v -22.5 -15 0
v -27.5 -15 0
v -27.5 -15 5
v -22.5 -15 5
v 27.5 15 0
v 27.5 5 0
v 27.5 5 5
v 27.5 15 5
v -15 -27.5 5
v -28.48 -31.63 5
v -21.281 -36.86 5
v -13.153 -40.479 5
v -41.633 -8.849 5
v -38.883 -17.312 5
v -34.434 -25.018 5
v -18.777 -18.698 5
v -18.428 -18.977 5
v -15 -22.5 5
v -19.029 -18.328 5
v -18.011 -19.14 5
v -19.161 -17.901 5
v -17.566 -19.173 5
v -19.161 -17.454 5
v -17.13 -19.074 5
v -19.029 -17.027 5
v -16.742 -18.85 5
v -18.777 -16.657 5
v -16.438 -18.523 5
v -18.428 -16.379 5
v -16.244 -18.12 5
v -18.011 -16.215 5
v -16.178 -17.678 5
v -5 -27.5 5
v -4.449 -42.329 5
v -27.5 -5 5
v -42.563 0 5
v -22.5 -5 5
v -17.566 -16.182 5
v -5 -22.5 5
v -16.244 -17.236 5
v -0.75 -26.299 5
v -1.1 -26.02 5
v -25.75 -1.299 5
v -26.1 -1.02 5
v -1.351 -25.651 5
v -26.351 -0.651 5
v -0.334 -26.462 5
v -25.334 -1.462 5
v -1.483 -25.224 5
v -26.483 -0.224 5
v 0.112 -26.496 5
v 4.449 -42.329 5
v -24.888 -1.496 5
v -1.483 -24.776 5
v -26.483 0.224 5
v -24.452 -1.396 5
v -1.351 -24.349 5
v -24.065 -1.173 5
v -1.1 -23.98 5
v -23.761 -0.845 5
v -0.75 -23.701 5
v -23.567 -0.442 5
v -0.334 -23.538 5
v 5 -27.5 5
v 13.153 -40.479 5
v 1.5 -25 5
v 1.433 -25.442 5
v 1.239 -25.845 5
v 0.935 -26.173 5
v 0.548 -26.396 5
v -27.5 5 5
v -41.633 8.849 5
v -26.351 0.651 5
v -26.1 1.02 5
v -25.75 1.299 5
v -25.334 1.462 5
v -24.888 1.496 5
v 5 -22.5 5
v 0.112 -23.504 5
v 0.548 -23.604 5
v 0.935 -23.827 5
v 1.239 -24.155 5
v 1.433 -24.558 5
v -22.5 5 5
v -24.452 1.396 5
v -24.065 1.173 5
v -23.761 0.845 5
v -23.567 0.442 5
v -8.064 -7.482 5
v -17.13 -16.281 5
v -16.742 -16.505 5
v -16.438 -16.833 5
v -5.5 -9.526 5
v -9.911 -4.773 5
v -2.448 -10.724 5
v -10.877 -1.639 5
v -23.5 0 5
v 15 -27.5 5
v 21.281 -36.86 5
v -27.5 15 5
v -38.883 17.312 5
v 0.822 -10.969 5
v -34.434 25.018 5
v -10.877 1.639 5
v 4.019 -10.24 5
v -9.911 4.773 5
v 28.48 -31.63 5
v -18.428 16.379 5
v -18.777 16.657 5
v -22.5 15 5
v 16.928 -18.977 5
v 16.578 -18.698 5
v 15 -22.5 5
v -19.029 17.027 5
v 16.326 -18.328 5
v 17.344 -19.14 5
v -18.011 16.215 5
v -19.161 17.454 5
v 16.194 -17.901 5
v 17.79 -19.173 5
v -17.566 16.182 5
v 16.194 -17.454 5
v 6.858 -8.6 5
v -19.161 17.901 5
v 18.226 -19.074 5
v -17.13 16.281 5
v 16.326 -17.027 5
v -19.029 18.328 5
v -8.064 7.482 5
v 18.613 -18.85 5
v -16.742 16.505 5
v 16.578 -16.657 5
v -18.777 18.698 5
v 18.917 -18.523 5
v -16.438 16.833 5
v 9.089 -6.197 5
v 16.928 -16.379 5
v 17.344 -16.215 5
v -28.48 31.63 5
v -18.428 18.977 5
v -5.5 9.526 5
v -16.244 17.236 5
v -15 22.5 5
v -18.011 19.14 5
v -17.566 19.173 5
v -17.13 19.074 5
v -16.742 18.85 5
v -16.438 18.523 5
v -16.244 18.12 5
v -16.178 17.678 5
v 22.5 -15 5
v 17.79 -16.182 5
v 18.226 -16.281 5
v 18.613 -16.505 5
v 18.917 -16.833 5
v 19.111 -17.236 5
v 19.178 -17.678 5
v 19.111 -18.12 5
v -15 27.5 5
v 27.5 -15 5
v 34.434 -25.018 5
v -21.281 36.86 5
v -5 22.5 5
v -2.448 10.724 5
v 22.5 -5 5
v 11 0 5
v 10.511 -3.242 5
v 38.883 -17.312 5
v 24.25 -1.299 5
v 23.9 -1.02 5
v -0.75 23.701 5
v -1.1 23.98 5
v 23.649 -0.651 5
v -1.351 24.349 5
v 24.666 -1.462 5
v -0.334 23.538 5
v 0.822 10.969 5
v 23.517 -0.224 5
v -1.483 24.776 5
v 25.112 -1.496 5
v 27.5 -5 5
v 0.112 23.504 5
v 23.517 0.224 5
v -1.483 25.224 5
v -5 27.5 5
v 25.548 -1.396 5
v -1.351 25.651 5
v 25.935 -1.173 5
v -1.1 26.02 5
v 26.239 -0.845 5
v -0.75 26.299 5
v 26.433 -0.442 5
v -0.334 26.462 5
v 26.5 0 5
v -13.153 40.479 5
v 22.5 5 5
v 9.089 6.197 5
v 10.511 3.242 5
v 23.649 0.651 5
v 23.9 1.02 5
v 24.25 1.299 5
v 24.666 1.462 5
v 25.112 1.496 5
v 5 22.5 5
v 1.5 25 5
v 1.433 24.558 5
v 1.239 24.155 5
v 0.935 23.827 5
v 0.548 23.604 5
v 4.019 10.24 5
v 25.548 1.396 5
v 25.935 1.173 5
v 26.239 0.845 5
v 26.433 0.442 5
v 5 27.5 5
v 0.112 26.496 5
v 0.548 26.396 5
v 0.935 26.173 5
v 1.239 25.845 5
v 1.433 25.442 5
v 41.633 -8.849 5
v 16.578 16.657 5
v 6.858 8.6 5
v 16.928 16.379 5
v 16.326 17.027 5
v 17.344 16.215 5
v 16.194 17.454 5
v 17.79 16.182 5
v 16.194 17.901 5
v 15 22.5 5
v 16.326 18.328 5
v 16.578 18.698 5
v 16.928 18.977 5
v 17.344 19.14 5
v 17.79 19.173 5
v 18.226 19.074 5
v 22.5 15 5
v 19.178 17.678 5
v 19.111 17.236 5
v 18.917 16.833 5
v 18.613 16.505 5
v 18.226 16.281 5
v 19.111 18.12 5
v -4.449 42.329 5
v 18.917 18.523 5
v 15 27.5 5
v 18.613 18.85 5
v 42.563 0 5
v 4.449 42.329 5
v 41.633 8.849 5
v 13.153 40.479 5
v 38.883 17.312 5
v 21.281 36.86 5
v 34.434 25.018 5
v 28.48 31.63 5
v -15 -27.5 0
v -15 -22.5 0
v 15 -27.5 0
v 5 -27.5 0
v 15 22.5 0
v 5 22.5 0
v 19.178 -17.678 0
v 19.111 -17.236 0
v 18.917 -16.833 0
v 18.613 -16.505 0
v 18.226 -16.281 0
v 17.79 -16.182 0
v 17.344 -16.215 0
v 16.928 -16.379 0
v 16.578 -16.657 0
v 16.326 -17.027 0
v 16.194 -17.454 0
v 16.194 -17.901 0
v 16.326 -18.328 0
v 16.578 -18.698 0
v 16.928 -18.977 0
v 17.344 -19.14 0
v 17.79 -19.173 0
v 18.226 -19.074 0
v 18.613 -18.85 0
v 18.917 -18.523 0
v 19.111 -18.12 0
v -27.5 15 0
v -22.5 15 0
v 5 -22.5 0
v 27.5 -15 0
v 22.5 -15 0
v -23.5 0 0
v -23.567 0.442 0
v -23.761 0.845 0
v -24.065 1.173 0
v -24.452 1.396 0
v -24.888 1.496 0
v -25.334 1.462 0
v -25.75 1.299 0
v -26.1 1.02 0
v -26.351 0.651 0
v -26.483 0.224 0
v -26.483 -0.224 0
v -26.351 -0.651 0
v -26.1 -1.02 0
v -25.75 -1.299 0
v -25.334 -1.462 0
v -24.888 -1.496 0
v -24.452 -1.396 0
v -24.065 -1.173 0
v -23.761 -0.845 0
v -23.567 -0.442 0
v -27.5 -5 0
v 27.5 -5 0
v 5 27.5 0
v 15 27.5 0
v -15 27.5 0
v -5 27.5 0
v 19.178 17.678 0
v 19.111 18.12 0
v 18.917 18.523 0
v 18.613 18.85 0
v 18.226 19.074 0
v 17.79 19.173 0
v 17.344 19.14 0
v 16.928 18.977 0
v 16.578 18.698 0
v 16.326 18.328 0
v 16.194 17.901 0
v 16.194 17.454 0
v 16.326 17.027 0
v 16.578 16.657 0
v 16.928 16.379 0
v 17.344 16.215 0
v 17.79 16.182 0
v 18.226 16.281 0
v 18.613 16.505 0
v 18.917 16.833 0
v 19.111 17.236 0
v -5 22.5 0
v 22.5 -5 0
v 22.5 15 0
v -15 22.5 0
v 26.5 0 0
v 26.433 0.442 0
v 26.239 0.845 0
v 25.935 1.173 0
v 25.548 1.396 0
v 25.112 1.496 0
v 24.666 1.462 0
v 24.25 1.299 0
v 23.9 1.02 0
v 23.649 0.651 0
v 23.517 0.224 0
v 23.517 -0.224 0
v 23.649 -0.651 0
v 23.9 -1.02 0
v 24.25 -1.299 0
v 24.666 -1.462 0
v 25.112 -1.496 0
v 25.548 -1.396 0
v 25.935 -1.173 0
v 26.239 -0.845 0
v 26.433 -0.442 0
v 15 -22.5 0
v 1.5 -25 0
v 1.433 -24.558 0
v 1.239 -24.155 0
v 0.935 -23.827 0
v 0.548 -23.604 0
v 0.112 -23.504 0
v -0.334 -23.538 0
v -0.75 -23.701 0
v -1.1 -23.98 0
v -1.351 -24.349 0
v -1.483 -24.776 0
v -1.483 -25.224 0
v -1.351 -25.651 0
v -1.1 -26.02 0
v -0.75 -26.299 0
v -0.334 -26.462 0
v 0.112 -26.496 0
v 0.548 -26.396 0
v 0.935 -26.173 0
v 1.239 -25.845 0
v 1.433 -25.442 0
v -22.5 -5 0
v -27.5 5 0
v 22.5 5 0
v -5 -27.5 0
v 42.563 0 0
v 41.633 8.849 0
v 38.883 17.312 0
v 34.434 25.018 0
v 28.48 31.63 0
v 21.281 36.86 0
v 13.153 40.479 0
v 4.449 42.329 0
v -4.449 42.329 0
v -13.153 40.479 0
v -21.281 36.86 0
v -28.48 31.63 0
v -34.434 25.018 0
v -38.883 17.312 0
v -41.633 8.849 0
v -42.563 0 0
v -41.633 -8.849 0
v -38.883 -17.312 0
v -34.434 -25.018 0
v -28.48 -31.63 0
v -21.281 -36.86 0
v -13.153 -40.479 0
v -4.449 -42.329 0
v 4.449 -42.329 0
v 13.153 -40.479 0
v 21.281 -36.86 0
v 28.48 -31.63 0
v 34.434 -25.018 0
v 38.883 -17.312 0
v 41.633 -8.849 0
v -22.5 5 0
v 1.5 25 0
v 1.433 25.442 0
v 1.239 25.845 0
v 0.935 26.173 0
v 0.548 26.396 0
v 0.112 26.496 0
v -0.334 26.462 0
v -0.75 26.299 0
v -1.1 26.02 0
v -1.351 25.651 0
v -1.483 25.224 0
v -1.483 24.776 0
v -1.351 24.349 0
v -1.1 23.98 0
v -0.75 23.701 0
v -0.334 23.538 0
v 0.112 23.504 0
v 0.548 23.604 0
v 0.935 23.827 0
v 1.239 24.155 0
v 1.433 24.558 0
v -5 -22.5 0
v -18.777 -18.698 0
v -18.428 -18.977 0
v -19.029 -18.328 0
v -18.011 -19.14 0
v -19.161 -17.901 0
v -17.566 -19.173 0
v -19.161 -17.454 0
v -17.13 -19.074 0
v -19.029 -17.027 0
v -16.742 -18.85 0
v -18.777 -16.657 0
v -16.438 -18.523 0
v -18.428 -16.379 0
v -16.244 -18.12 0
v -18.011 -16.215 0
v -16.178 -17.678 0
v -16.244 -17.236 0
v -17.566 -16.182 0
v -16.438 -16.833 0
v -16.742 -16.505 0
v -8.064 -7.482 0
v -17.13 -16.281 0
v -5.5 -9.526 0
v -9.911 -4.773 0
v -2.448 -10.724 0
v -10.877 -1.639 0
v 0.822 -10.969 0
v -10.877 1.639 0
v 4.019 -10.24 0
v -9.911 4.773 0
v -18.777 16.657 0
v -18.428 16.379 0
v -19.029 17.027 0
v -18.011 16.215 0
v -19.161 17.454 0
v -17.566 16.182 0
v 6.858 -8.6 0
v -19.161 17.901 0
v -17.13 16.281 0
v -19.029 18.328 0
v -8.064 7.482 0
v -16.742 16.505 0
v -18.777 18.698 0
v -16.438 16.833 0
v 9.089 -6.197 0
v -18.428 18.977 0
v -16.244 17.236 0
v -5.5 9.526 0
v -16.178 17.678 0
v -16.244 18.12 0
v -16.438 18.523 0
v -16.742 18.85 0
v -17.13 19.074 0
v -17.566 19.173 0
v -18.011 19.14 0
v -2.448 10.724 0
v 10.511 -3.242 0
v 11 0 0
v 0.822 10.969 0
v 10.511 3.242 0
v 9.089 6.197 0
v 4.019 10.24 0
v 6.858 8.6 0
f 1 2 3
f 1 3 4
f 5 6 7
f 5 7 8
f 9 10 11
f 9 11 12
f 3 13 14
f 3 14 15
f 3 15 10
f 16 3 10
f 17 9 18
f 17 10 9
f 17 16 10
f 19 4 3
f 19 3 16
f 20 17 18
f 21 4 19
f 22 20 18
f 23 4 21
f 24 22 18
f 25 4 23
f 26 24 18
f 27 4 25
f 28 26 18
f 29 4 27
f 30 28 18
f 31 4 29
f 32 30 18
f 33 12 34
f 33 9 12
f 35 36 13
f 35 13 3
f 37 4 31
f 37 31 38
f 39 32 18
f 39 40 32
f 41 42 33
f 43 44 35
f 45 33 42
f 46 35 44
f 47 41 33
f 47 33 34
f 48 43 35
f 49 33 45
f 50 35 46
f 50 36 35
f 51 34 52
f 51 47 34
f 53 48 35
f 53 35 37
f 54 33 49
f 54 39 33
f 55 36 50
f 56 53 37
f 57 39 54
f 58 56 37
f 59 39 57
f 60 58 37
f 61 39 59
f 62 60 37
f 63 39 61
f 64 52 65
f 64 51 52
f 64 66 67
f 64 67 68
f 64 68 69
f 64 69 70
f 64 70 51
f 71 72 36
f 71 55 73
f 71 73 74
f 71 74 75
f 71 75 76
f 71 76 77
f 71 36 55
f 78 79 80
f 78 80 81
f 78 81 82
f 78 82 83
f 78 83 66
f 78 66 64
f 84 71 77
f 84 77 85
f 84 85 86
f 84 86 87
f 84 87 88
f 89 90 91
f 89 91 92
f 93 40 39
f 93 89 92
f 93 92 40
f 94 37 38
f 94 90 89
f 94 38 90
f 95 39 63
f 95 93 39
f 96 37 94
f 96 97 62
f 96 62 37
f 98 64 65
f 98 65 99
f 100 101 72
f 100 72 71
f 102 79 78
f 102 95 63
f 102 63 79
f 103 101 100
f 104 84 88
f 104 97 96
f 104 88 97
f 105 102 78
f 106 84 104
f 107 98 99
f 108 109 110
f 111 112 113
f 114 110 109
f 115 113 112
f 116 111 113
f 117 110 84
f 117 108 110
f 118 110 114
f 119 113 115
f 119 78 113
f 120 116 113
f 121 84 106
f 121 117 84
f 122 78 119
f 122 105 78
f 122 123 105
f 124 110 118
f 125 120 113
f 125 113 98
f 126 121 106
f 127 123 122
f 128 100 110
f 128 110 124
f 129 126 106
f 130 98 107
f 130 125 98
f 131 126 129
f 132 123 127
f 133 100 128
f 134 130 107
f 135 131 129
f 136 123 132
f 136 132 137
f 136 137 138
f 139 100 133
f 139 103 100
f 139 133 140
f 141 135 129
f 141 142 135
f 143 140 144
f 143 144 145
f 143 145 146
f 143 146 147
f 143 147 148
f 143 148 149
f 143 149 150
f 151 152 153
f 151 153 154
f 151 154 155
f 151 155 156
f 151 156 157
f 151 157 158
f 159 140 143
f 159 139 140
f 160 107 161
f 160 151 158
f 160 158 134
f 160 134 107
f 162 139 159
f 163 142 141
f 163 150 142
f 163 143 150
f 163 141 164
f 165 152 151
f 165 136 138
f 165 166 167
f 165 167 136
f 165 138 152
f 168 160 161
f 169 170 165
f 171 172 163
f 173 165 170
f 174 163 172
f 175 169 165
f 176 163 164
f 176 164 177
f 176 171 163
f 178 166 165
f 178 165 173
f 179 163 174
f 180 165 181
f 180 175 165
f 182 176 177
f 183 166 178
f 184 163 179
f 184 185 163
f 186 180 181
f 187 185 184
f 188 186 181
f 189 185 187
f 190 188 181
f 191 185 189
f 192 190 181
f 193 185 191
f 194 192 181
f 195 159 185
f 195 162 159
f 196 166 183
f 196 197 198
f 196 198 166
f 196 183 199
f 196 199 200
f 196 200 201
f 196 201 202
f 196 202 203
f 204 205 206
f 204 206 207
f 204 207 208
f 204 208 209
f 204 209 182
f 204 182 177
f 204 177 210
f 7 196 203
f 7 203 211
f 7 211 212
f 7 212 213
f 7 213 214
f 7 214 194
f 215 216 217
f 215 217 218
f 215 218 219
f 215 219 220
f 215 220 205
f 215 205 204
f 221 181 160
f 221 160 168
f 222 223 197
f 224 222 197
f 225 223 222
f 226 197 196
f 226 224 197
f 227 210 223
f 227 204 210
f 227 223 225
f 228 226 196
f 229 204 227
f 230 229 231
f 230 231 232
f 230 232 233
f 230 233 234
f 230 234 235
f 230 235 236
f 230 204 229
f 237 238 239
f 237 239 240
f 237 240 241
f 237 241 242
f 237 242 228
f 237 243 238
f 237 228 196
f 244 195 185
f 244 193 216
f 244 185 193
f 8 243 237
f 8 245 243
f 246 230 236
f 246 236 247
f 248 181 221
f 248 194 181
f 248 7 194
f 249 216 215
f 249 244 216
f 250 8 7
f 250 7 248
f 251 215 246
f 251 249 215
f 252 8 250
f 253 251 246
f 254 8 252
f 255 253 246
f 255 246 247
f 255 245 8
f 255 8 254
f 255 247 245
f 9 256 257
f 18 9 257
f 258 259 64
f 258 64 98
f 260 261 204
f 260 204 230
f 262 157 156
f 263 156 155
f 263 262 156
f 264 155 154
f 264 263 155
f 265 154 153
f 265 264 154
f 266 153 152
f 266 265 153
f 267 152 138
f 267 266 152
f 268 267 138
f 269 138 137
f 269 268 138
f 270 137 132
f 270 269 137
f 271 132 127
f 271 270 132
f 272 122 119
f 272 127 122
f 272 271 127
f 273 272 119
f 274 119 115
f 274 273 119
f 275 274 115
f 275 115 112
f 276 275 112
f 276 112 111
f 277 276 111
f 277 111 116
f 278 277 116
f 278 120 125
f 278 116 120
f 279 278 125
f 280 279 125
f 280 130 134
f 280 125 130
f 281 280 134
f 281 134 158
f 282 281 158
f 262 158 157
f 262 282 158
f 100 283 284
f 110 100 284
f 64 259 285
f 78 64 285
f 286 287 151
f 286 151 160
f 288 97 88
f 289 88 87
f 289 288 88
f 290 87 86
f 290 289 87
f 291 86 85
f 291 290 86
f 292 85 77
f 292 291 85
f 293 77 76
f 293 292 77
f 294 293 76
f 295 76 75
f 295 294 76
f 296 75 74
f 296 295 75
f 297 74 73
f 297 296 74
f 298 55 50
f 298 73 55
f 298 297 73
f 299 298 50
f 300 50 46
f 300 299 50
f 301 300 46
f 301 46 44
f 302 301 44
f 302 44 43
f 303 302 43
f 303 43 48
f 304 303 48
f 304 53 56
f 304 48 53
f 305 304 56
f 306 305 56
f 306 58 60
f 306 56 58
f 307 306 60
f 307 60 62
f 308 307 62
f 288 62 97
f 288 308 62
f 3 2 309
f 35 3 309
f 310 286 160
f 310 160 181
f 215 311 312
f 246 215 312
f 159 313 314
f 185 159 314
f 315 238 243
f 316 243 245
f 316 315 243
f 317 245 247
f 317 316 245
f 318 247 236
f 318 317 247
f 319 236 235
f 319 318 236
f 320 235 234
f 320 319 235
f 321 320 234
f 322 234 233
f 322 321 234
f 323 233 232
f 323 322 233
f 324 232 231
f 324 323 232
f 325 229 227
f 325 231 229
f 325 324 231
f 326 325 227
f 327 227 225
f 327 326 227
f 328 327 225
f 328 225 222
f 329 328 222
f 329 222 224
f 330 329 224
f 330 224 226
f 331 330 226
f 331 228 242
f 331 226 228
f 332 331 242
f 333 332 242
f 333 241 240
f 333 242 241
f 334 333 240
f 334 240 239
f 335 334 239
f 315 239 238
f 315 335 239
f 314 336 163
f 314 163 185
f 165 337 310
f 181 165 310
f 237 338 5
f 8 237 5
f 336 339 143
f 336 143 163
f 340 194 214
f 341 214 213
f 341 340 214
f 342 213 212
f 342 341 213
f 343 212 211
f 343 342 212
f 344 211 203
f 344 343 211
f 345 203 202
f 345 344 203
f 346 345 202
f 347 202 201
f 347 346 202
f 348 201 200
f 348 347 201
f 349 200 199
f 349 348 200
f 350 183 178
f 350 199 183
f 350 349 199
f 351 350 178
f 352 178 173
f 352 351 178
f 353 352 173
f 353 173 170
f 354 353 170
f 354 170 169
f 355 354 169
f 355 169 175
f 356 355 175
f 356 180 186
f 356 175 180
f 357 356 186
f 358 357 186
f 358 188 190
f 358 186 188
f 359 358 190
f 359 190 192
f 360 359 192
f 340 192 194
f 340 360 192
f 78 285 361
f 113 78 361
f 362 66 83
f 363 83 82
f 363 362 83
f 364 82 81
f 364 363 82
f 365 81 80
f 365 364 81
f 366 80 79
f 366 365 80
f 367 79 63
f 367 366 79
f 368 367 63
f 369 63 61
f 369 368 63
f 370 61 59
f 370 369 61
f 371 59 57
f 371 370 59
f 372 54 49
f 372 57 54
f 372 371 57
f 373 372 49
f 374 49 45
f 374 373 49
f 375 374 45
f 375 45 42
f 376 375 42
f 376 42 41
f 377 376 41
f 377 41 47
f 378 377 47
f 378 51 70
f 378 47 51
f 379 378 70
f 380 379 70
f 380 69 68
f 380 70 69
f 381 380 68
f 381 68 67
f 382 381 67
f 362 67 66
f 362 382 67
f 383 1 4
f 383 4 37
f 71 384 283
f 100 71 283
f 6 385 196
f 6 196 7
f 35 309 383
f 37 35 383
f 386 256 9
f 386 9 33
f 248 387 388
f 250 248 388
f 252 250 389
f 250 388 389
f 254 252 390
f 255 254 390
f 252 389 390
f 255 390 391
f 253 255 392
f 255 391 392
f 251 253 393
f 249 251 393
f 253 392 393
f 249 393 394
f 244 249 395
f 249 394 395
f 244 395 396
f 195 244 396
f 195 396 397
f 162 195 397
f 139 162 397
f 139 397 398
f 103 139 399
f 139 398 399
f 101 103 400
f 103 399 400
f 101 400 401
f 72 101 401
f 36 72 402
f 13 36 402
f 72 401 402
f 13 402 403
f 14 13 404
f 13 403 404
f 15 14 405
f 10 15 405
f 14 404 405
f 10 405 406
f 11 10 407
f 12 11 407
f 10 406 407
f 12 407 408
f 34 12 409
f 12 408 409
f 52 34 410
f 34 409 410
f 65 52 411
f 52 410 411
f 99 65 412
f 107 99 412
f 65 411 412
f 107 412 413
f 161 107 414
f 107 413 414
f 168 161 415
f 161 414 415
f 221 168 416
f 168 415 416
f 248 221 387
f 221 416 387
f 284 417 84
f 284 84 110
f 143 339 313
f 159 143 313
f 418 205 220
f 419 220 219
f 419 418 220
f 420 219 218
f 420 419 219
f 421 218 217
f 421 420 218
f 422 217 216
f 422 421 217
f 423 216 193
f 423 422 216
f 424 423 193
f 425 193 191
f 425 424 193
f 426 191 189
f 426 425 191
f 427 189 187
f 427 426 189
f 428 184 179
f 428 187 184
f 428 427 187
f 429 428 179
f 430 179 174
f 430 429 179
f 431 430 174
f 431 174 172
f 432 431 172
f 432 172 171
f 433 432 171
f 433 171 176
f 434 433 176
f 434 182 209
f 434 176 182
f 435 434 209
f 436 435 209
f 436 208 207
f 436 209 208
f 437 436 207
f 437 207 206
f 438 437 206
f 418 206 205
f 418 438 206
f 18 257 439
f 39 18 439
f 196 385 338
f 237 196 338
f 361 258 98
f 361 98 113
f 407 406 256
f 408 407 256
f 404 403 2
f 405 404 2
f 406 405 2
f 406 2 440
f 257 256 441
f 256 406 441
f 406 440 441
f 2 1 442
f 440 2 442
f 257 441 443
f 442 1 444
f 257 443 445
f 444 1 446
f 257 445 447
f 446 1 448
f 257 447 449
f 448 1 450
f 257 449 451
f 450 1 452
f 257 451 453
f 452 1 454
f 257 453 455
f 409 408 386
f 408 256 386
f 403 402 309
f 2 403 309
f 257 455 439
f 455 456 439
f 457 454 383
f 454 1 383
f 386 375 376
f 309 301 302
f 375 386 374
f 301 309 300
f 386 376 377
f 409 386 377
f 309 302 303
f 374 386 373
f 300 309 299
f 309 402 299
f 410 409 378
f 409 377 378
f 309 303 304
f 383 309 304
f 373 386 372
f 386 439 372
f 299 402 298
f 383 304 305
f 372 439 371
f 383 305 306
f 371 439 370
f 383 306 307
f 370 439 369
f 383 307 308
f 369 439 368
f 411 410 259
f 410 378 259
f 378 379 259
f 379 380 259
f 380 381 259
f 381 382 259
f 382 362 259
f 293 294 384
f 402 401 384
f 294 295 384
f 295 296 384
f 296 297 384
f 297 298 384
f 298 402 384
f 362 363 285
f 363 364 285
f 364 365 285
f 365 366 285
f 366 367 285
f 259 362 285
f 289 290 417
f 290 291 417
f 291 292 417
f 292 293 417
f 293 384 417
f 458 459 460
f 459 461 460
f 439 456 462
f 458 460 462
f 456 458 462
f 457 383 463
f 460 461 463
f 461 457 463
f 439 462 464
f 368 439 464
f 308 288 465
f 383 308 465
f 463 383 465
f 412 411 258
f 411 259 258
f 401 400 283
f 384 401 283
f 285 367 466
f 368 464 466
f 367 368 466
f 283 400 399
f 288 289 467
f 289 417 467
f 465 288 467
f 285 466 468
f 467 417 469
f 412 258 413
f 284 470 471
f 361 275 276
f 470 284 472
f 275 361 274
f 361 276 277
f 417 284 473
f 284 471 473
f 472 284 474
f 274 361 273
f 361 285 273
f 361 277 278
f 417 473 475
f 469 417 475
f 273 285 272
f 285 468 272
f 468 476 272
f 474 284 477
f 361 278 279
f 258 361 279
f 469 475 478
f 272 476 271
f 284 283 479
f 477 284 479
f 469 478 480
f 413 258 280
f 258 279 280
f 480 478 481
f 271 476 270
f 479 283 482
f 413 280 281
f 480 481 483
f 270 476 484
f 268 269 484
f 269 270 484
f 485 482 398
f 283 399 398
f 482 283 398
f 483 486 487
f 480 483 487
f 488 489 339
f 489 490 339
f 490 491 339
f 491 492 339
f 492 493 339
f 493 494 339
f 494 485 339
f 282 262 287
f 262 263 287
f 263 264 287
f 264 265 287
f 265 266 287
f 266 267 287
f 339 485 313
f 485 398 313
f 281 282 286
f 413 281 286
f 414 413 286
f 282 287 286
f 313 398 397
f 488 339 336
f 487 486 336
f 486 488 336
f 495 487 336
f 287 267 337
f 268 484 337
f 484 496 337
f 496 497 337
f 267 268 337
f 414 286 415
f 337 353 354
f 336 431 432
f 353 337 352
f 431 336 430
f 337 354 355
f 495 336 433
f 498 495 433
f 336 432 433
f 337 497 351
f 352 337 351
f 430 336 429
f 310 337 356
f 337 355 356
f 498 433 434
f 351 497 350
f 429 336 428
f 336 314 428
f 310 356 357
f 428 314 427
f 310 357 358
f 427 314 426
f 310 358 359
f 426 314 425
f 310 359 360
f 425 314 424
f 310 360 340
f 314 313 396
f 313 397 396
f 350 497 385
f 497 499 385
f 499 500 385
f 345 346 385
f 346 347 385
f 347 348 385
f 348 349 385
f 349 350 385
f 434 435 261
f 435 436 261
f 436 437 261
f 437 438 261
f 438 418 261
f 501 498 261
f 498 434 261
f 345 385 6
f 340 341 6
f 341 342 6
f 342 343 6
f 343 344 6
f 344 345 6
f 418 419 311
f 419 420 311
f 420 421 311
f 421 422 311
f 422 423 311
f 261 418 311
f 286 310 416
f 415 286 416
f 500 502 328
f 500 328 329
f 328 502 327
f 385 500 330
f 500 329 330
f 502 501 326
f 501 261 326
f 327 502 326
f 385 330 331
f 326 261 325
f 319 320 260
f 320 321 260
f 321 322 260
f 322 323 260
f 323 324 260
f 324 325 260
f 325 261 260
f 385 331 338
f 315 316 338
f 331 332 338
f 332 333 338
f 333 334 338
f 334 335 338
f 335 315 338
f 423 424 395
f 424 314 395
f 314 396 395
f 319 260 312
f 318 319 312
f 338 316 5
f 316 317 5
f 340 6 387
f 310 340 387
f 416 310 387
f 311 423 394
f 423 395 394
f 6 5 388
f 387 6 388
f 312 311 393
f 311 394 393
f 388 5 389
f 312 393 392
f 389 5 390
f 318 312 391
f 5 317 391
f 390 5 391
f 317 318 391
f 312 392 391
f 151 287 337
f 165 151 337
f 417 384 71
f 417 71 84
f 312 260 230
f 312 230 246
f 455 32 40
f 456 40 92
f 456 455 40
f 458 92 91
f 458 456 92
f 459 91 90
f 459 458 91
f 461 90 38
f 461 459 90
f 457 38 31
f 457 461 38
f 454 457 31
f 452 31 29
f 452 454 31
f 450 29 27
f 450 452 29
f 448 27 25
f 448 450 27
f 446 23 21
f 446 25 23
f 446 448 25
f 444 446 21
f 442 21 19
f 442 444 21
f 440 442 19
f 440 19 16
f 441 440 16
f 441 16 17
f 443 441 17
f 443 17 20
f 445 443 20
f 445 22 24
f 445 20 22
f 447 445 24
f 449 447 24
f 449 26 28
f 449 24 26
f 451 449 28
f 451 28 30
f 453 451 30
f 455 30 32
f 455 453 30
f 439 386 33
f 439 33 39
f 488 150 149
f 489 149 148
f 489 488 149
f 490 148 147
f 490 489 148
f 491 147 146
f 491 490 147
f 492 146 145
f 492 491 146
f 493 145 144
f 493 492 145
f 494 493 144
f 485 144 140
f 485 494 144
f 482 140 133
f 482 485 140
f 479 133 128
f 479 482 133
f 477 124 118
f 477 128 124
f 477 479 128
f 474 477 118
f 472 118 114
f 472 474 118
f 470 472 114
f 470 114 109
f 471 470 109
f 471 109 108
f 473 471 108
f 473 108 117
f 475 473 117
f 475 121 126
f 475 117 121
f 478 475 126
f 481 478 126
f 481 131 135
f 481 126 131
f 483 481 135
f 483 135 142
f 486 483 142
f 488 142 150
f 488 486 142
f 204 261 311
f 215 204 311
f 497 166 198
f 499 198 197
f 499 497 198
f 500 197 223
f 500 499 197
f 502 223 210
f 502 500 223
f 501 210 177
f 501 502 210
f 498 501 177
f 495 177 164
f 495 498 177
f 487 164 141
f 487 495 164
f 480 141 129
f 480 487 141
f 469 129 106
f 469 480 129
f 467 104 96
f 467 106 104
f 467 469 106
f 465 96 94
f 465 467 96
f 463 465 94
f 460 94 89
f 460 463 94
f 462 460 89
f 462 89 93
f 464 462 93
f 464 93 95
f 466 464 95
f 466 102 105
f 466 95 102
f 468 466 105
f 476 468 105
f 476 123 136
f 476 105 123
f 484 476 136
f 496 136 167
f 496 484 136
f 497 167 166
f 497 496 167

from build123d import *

# Parameters (mm, degrees)
SCHIZZO1_R                   = 42.562660939
ESTRUSIONE_ESTRUSIONE1_DEPTH = 5
SCHIZZO3_R                   = 11
TAGLIO_ESTRUSIONE2_DEPTH     = 6
SCHIZZO4_R                   = 1.5
SCHIZZO4_W                   = 5
SCHIZZO4_H                   = 10
SCHIZZO4_W_2                 = 10
SCHIZZO4_H_2                 = 5
TAGLIO_ESTRUSIONE3_DEPTH     = 6


with BuildPart() as part:
    # Schizzo1 → Estrusione-Estrusione1 (new body)
    with BuildSketch(Plane.XY):
        Circle(SCHIZZO1_R)
    extrude(amount=ESTRUSIONE_ESTRUSIONE1_DEPTH)

    # Schizzo3 → Taglio-Estrusione2 (cut, through all)
    with BuildSketch(Plane.XY):
        Circle(SCHIZZO3_R)
    extrude(amount=TAGLIO_ESTRUSIONE2_DEPTH, mode=Mode.SUBTRACT)

    # Schizzo4 → Taglio-Estrusione3 (cut, through all)
    with BuildSketch(Plane.XY):
        with Locations((0, 25)):
            Circle(SCHIZZO4_R)
        with Locations((17.67766953, 17.67766953)):
            Circle(SCHIZZO4_R)
        with Locations((25, 0)):
            Circle(SCHIZZO4_R)
        with Locations((17.67766953, -17.67766953)):
            Circle(SCHIZZO4_R)
        with Locations((0, -25)):
            Circle(SCHIZZO4_R)
        with Locations((-17.67766953, -17.67766953)):
            Circle(SCHIZZO4_R)
        with Locations((-25, 0)):
            Circle(SCHIZZO4_R)
        with Locations((-17.67766953, 17.67766953)):
            Circle(SCHIZZO4_R)
        with Locations((-25, -10)):
            Rectangle(SCHIZZO4_W, SCHIZZO4_H)
        with Locations((-25, 10)):
            Rectangle(SCHIZZO4_W, SCHIZZO4_H)
        with Locations((10, 25)):
            Rectangle(SCHIZZO4_W_2, SCHIZZO4_H_2)
        with Locations((-10, 25)):
            Rectangle(SCHIZZO4_W_2, SCHIZZO4_H_2)
        with Locations((25, -10)):
            Rectangle(SCHIZZO4_W, SCHIZZO4_H)
        with Locations((25, 10)):
            Rectangle(SCHIZZO4_W, SCHIZZO4_H)
        with Locations((-10, -25)):
            Rectangle(SCHIZZO4_W_2, SCHIZZO4_H_2)
        with Locations((10, -25)):
            Rectangle(SCHIZZO4_W_2, SCHIZZO4_H_2)
    extrude(amount=TAGLIO_ESTRUSIONE3_DEPTH, mode=Mode.SUBTRACT)


solid = part.part
